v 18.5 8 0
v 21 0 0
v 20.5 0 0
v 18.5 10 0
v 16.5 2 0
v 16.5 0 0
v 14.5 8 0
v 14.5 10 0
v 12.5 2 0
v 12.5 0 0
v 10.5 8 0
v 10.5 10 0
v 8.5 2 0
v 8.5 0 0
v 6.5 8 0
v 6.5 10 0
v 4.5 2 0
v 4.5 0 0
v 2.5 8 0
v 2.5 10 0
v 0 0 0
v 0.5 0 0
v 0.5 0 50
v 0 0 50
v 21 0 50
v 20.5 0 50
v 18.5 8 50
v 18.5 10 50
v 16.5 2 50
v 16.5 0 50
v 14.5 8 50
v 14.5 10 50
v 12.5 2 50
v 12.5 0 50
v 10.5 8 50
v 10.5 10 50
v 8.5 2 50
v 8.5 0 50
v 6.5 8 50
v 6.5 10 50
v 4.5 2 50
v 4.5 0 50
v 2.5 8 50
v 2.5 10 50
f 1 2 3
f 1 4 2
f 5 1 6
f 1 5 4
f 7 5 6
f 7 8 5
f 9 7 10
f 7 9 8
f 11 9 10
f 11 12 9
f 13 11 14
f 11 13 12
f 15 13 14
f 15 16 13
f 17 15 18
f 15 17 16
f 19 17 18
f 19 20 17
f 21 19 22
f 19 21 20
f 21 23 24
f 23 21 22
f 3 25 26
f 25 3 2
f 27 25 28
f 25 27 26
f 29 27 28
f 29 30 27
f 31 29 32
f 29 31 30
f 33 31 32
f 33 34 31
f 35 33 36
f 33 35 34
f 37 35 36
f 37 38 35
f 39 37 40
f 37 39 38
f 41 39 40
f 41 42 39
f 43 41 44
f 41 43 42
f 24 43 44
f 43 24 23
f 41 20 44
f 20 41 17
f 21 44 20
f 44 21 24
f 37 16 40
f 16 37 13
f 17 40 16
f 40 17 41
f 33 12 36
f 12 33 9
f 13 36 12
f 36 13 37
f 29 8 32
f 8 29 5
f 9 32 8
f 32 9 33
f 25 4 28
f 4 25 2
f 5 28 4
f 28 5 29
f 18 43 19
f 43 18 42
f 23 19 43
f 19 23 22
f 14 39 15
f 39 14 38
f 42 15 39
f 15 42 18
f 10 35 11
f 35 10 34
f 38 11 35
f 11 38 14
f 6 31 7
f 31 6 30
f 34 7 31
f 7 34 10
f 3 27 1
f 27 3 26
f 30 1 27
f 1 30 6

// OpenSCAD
// ZZ Wall - a simple zig-zag wall, originally intended to exersize the printer 
// because of it's rapid back and forth movements along the y axis.
// Author: Joseph M. Joy

function range(stop, start=0,  step=1) = [start: step: stop-1];

// Coords of an isoceles right triangle
function ir_tri(base) = [[0,0], [base/2, base], [base, 0]];


thickness = 1; // Actually thickness of wall at triangle apex

// Extruded version
module rt_prism(base, height)  {
    linear_extrude(height) polygon(ir_tri(base));
}

// A row of extruded triangles
module prism_rows(tri_height, height, n) {
    for (i = range(n)) {
         translate([(tri_height - thickness)*i, 0, 0]) rt_prism(tri_height, height);
    }
}


// Final grabber structure
module zz_wall(width, height, tri_height = 10) {
    n = width /tri_height; // each row is 3*tri_height, including space
    difference() {
        prism_rows(tri_height, height, n);
        translate([0, 0, -0.5]) scale([1, 1, 1.1]) // to punch holes on ends
        translate([0, - thickness, 0]) prism_rows(tri_height, height, n);

    }
}

scale([1, 2, 1])
zz_wall(25, 50, 5);
